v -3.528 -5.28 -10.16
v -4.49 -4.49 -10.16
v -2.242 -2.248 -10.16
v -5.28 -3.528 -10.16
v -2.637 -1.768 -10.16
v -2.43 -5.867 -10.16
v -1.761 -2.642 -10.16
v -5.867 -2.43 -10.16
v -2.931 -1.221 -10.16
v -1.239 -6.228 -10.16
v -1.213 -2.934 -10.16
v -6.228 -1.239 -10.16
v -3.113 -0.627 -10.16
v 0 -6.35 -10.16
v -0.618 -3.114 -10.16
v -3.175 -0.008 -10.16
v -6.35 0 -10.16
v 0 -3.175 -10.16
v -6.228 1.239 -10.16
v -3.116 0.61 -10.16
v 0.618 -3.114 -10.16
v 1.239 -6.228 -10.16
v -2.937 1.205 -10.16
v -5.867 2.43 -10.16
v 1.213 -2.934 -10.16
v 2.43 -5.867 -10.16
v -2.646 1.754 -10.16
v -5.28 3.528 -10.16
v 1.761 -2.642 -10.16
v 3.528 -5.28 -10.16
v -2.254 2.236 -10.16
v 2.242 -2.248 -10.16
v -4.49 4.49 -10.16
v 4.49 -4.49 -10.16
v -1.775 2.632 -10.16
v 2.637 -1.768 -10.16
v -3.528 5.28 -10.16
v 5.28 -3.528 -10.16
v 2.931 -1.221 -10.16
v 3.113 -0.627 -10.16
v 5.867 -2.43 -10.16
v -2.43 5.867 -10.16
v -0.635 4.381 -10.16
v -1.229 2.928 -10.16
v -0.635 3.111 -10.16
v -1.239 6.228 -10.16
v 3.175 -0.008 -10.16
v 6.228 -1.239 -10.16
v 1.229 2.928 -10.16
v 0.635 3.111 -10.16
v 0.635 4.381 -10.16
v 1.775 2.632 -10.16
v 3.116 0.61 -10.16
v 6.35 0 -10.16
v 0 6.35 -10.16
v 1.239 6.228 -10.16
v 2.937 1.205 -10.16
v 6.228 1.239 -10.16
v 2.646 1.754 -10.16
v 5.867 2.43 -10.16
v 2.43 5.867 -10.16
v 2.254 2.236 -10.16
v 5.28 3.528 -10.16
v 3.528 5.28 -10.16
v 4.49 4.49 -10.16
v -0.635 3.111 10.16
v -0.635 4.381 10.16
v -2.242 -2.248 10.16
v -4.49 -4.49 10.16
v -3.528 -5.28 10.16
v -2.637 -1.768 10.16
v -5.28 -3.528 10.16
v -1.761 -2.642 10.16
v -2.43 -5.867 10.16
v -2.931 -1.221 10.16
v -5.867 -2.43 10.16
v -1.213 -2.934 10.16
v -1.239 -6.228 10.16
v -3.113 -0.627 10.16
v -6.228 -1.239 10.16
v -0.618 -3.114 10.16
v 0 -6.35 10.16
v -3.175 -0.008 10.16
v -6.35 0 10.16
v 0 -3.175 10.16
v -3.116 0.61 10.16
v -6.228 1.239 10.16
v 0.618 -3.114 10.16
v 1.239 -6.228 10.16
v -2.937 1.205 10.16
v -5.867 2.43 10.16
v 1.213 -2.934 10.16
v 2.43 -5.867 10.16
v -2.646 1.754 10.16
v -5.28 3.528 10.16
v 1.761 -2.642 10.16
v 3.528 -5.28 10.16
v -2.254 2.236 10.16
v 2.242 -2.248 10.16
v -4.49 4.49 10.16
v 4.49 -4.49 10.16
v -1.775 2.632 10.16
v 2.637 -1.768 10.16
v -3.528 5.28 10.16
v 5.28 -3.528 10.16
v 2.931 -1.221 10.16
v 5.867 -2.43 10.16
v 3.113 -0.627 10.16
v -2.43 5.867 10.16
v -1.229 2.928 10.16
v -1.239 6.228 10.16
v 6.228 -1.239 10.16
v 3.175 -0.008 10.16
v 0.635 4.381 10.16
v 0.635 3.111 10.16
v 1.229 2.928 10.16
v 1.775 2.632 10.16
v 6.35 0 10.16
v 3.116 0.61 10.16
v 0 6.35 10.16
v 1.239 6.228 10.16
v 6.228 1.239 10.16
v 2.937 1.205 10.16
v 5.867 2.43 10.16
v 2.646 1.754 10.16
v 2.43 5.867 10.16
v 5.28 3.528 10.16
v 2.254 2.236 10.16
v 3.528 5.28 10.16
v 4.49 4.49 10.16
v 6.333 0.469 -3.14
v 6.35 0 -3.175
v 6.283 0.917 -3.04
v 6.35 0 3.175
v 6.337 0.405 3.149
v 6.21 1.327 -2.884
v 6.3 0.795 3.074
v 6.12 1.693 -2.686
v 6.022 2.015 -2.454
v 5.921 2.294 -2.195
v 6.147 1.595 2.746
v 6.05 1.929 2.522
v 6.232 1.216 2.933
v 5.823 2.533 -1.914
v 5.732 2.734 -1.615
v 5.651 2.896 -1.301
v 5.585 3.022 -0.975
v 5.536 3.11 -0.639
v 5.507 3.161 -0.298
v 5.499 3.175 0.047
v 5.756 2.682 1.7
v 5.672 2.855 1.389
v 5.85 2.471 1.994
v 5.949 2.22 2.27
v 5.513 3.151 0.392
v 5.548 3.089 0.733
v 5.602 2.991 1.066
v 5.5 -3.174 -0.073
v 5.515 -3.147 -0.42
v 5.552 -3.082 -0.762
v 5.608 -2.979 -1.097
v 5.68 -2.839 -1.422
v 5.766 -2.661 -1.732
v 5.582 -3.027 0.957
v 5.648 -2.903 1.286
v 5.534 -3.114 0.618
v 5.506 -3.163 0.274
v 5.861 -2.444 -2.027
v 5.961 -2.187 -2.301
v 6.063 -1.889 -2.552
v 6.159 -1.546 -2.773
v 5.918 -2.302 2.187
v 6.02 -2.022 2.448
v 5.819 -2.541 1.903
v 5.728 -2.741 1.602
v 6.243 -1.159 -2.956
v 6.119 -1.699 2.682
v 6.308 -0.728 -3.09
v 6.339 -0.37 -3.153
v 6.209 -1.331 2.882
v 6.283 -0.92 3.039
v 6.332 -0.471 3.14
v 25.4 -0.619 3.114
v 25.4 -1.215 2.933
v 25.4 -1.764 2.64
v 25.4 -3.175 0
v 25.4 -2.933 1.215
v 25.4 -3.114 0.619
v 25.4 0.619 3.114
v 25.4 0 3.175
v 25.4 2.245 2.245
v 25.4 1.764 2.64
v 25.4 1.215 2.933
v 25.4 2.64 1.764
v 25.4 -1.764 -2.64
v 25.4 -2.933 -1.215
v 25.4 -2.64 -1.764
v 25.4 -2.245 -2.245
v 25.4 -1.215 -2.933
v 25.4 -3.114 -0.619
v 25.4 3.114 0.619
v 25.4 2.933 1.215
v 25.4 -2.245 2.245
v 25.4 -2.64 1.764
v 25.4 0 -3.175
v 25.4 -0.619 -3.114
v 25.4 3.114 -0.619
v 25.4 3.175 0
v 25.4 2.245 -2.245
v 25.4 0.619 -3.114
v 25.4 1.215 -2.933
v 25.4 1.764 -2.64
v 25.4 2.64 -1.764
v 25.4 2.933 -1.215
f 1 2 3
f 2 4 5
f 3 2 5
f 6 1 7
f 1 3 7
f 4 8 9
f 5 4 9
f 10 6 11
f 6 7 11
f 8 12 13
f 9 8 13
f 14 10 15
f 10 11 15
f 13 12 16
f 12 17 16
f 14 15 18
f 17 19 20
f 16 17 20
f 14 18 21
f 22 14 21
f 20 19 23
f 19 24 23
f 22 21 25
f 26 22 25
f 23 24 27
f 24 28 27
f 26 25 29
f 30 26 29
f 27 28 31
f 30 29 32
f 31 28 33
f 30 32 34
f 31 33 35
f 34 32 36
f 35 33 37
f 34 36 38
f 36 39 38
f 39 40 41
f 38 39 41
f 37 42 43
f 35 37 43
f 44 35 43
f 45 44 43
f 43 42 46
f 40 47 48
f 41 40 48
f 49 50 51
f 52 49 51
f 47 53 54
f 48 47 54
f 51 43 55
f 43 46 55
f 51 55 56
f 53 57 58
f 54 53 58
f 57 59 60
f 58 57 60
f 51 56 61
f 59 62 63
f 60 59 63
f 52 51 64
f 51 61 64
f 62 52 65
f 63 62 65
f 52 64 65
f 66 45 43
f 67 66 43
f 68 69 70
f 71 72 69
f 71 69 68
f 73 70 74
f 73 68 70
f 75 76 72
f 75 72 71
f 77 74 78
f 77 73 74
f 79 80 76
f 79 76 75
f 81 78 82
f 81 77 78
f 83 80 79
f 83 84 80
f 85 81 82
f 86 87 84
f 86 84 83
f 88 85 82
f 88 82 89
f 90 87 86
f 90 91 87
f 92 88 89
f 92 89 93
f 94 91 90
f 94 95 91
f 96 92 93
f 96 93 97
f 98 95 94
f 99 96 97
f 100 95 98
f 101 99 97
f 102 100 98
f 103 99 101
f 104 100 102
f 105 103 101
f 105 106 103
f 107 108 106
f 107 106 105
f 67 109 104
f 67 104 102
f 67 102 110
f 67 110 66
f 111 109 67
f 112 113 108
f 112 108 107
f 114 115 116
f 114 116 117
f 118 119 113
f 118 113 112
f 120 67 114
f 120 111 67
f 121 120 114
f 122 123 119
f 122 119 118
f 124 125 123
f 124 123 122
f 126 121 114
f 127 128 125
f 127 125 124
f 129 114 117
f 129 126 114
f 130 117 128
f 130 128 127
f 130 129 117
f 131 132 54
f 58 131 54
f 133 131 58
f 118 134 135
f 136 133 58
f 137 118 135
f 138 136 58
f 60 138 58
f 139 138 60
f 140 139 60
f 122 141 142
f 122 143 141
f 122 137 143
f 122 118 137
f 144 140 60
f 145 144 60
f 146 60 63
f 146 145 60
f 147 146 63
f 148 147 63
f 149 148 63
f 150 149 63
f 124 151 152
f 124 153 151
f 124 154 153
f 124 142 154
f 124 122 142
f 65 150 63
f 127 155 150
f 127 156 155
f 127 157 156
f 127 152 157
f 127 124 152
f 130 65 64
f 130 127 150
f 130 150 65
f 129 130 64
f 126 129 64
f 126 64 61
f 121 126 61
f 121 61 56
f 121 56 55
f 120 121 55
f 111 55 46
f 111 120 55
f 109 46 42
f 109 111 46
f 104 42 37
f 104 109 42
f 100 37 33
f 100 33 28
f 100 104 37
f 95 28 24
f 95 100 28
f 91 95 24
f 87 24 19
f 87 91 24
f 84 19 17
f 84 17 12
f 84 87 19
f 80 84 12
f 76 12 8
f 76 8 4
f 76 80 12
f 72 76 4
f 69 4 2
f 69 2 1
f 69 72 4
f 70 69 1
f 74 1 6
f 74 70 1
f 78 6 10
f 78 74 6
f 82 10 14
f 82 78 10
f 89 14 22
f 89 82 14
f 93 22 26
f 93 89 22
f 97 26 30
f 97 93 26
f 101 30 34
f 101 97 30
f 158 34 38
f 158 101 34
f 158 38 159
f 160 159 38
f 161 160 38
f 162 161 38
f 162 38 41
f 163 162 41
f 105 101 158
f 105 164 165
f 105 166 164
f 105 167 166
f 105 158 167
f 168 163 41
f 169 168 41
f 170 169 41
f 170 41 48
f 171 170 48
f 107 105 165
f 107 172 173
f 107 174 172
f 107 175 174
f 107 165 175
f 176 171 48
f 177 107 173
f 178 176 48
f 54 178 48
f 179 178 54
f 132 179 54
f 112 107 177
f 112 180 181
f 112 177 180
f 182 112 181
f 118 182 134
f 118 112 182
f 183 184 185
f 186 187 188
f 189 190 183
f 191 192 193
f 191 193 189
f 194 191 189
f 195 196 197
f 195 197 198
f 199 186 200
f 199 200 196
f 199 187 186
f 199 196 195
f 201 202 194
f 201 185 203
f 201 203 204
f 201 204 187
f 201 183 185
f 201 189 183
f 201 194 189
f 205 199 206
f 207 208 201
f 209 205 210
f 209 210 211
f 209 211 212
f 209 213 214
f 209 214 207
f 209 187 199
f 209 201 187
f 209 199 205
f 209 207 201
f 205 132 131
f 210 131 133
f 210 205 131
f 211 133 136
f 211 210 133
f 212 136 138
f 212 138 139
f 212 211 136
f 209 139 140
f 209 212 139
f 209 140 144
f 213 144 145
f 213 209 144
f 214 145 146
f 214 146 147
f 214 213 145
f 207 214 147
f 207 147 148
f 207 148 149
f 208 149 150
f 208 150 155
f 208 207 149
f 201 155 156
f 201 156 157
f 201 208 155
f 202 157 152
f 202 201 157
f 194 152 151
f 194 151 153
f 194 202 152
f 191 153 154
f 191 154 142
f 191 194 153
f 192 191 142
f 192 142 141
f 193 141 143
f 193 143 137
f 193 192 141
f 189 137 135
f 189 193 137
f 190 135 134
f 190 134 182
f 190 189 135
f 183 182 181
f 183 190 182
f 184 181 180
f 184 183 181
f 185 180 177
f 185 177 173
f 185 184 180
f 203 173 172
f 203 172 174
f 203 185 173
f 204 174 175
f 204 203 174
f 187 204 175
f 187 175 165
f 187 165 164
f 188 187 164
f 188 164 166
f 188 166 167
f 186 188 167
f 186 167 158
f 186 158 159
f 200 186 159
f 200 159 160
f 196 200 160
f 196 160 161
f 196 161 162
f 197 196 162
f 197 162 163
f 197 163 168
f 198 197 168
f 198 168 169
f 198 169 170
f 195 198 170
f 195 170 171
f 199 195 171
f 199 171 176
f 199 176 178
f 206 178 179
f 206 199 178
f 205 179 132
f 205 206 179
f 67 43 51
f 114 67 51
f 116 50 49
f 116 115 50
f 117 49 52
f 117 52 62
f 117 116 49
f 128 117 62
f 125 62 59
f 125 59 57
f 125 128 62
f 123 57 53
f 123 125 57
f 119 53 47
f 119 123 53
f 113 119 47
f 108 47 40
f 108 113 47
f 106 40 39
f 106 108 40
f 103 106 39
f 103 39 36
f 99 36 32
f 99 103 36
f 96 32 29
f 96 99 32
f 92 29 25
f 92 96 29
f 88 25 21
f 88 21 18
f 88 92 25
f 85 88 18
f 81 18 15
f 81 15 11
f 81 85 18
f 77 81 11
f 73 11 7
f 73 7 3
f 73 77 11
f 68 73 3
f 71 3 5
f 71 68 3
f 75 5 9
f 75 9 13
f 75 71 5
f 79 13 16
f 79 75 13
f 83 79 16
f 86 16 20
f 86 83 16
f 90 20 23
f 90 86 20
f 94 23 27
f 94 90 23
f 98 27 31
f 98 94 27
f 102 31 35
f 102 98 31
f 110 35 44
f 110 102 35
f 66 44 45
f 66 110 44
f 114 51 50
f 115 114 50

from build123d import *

# Parameters (mm, degrees)
SKETCH1_R                = 6.35
BOSS_EXTRUDE1_DEPTH      = 10.16
BOSS_EXTRUDE2_REACH      = 35.935
BOSS_EXTRUDE2_END_RADIUS = 6.35
SKETCH2_R                = 3.175


with BuildPart() as part:
    # Sketch1 → Boss-Extrude1 (new, symmetric)
    with BuildSketch(Plane.XY):
        Circle(SKETCH1_R)
        with BuildLine():
            Line((-0.635, 3.110851973), (-0.635, 4.380851973))
            Line((-0.635, 4.380851973), (0.635, 4.380851973))
            Line((0.635, 4.380851973), (0.635, 3.110851973))
            ThreePointArc((0.635, 3.110851973), (0, -3.175), (-0.635, 3.110851973))
        make_face(mode=Mode.SUBTRACT)
    extrude(amount=BOSS_EXTRUDE1_DEPTH, both=True)

    # Boss-Extrude2: up to this cylinder (the profile starts outside it)
    boss_extrude2_end = Plane(origin=(0, 0, 0), z_dir=(0, 0, -1)) * Cylinder(BOSS_EXTRUDE2_END_RADIUS, 85.57, mode=Mode.PRIVATE)
    # Sketch2 → Boss-Extrude2 (add, up to the surface)
    with BuildSketch(Plane(origin=(25.4, 0, 0), x_dir=(0, 0, -1), z_dir=(1, 0, 0)), mode=Mode.PRIVATE) as boss_extrude2_sk1:
        Circle(SKETCH2_R)
    boss_extrude2_tool1 = extrude(boss_extrude2_sk1.sketch, amount=-BOSS_EXTRUDE2_REACH, mode=Mode.PRIVATE) - boss_extrude2_end
    add(boss_extrude2_tool1.solids().sort_by_distance((25.4, 0, 0))[0])


solid = part.part
